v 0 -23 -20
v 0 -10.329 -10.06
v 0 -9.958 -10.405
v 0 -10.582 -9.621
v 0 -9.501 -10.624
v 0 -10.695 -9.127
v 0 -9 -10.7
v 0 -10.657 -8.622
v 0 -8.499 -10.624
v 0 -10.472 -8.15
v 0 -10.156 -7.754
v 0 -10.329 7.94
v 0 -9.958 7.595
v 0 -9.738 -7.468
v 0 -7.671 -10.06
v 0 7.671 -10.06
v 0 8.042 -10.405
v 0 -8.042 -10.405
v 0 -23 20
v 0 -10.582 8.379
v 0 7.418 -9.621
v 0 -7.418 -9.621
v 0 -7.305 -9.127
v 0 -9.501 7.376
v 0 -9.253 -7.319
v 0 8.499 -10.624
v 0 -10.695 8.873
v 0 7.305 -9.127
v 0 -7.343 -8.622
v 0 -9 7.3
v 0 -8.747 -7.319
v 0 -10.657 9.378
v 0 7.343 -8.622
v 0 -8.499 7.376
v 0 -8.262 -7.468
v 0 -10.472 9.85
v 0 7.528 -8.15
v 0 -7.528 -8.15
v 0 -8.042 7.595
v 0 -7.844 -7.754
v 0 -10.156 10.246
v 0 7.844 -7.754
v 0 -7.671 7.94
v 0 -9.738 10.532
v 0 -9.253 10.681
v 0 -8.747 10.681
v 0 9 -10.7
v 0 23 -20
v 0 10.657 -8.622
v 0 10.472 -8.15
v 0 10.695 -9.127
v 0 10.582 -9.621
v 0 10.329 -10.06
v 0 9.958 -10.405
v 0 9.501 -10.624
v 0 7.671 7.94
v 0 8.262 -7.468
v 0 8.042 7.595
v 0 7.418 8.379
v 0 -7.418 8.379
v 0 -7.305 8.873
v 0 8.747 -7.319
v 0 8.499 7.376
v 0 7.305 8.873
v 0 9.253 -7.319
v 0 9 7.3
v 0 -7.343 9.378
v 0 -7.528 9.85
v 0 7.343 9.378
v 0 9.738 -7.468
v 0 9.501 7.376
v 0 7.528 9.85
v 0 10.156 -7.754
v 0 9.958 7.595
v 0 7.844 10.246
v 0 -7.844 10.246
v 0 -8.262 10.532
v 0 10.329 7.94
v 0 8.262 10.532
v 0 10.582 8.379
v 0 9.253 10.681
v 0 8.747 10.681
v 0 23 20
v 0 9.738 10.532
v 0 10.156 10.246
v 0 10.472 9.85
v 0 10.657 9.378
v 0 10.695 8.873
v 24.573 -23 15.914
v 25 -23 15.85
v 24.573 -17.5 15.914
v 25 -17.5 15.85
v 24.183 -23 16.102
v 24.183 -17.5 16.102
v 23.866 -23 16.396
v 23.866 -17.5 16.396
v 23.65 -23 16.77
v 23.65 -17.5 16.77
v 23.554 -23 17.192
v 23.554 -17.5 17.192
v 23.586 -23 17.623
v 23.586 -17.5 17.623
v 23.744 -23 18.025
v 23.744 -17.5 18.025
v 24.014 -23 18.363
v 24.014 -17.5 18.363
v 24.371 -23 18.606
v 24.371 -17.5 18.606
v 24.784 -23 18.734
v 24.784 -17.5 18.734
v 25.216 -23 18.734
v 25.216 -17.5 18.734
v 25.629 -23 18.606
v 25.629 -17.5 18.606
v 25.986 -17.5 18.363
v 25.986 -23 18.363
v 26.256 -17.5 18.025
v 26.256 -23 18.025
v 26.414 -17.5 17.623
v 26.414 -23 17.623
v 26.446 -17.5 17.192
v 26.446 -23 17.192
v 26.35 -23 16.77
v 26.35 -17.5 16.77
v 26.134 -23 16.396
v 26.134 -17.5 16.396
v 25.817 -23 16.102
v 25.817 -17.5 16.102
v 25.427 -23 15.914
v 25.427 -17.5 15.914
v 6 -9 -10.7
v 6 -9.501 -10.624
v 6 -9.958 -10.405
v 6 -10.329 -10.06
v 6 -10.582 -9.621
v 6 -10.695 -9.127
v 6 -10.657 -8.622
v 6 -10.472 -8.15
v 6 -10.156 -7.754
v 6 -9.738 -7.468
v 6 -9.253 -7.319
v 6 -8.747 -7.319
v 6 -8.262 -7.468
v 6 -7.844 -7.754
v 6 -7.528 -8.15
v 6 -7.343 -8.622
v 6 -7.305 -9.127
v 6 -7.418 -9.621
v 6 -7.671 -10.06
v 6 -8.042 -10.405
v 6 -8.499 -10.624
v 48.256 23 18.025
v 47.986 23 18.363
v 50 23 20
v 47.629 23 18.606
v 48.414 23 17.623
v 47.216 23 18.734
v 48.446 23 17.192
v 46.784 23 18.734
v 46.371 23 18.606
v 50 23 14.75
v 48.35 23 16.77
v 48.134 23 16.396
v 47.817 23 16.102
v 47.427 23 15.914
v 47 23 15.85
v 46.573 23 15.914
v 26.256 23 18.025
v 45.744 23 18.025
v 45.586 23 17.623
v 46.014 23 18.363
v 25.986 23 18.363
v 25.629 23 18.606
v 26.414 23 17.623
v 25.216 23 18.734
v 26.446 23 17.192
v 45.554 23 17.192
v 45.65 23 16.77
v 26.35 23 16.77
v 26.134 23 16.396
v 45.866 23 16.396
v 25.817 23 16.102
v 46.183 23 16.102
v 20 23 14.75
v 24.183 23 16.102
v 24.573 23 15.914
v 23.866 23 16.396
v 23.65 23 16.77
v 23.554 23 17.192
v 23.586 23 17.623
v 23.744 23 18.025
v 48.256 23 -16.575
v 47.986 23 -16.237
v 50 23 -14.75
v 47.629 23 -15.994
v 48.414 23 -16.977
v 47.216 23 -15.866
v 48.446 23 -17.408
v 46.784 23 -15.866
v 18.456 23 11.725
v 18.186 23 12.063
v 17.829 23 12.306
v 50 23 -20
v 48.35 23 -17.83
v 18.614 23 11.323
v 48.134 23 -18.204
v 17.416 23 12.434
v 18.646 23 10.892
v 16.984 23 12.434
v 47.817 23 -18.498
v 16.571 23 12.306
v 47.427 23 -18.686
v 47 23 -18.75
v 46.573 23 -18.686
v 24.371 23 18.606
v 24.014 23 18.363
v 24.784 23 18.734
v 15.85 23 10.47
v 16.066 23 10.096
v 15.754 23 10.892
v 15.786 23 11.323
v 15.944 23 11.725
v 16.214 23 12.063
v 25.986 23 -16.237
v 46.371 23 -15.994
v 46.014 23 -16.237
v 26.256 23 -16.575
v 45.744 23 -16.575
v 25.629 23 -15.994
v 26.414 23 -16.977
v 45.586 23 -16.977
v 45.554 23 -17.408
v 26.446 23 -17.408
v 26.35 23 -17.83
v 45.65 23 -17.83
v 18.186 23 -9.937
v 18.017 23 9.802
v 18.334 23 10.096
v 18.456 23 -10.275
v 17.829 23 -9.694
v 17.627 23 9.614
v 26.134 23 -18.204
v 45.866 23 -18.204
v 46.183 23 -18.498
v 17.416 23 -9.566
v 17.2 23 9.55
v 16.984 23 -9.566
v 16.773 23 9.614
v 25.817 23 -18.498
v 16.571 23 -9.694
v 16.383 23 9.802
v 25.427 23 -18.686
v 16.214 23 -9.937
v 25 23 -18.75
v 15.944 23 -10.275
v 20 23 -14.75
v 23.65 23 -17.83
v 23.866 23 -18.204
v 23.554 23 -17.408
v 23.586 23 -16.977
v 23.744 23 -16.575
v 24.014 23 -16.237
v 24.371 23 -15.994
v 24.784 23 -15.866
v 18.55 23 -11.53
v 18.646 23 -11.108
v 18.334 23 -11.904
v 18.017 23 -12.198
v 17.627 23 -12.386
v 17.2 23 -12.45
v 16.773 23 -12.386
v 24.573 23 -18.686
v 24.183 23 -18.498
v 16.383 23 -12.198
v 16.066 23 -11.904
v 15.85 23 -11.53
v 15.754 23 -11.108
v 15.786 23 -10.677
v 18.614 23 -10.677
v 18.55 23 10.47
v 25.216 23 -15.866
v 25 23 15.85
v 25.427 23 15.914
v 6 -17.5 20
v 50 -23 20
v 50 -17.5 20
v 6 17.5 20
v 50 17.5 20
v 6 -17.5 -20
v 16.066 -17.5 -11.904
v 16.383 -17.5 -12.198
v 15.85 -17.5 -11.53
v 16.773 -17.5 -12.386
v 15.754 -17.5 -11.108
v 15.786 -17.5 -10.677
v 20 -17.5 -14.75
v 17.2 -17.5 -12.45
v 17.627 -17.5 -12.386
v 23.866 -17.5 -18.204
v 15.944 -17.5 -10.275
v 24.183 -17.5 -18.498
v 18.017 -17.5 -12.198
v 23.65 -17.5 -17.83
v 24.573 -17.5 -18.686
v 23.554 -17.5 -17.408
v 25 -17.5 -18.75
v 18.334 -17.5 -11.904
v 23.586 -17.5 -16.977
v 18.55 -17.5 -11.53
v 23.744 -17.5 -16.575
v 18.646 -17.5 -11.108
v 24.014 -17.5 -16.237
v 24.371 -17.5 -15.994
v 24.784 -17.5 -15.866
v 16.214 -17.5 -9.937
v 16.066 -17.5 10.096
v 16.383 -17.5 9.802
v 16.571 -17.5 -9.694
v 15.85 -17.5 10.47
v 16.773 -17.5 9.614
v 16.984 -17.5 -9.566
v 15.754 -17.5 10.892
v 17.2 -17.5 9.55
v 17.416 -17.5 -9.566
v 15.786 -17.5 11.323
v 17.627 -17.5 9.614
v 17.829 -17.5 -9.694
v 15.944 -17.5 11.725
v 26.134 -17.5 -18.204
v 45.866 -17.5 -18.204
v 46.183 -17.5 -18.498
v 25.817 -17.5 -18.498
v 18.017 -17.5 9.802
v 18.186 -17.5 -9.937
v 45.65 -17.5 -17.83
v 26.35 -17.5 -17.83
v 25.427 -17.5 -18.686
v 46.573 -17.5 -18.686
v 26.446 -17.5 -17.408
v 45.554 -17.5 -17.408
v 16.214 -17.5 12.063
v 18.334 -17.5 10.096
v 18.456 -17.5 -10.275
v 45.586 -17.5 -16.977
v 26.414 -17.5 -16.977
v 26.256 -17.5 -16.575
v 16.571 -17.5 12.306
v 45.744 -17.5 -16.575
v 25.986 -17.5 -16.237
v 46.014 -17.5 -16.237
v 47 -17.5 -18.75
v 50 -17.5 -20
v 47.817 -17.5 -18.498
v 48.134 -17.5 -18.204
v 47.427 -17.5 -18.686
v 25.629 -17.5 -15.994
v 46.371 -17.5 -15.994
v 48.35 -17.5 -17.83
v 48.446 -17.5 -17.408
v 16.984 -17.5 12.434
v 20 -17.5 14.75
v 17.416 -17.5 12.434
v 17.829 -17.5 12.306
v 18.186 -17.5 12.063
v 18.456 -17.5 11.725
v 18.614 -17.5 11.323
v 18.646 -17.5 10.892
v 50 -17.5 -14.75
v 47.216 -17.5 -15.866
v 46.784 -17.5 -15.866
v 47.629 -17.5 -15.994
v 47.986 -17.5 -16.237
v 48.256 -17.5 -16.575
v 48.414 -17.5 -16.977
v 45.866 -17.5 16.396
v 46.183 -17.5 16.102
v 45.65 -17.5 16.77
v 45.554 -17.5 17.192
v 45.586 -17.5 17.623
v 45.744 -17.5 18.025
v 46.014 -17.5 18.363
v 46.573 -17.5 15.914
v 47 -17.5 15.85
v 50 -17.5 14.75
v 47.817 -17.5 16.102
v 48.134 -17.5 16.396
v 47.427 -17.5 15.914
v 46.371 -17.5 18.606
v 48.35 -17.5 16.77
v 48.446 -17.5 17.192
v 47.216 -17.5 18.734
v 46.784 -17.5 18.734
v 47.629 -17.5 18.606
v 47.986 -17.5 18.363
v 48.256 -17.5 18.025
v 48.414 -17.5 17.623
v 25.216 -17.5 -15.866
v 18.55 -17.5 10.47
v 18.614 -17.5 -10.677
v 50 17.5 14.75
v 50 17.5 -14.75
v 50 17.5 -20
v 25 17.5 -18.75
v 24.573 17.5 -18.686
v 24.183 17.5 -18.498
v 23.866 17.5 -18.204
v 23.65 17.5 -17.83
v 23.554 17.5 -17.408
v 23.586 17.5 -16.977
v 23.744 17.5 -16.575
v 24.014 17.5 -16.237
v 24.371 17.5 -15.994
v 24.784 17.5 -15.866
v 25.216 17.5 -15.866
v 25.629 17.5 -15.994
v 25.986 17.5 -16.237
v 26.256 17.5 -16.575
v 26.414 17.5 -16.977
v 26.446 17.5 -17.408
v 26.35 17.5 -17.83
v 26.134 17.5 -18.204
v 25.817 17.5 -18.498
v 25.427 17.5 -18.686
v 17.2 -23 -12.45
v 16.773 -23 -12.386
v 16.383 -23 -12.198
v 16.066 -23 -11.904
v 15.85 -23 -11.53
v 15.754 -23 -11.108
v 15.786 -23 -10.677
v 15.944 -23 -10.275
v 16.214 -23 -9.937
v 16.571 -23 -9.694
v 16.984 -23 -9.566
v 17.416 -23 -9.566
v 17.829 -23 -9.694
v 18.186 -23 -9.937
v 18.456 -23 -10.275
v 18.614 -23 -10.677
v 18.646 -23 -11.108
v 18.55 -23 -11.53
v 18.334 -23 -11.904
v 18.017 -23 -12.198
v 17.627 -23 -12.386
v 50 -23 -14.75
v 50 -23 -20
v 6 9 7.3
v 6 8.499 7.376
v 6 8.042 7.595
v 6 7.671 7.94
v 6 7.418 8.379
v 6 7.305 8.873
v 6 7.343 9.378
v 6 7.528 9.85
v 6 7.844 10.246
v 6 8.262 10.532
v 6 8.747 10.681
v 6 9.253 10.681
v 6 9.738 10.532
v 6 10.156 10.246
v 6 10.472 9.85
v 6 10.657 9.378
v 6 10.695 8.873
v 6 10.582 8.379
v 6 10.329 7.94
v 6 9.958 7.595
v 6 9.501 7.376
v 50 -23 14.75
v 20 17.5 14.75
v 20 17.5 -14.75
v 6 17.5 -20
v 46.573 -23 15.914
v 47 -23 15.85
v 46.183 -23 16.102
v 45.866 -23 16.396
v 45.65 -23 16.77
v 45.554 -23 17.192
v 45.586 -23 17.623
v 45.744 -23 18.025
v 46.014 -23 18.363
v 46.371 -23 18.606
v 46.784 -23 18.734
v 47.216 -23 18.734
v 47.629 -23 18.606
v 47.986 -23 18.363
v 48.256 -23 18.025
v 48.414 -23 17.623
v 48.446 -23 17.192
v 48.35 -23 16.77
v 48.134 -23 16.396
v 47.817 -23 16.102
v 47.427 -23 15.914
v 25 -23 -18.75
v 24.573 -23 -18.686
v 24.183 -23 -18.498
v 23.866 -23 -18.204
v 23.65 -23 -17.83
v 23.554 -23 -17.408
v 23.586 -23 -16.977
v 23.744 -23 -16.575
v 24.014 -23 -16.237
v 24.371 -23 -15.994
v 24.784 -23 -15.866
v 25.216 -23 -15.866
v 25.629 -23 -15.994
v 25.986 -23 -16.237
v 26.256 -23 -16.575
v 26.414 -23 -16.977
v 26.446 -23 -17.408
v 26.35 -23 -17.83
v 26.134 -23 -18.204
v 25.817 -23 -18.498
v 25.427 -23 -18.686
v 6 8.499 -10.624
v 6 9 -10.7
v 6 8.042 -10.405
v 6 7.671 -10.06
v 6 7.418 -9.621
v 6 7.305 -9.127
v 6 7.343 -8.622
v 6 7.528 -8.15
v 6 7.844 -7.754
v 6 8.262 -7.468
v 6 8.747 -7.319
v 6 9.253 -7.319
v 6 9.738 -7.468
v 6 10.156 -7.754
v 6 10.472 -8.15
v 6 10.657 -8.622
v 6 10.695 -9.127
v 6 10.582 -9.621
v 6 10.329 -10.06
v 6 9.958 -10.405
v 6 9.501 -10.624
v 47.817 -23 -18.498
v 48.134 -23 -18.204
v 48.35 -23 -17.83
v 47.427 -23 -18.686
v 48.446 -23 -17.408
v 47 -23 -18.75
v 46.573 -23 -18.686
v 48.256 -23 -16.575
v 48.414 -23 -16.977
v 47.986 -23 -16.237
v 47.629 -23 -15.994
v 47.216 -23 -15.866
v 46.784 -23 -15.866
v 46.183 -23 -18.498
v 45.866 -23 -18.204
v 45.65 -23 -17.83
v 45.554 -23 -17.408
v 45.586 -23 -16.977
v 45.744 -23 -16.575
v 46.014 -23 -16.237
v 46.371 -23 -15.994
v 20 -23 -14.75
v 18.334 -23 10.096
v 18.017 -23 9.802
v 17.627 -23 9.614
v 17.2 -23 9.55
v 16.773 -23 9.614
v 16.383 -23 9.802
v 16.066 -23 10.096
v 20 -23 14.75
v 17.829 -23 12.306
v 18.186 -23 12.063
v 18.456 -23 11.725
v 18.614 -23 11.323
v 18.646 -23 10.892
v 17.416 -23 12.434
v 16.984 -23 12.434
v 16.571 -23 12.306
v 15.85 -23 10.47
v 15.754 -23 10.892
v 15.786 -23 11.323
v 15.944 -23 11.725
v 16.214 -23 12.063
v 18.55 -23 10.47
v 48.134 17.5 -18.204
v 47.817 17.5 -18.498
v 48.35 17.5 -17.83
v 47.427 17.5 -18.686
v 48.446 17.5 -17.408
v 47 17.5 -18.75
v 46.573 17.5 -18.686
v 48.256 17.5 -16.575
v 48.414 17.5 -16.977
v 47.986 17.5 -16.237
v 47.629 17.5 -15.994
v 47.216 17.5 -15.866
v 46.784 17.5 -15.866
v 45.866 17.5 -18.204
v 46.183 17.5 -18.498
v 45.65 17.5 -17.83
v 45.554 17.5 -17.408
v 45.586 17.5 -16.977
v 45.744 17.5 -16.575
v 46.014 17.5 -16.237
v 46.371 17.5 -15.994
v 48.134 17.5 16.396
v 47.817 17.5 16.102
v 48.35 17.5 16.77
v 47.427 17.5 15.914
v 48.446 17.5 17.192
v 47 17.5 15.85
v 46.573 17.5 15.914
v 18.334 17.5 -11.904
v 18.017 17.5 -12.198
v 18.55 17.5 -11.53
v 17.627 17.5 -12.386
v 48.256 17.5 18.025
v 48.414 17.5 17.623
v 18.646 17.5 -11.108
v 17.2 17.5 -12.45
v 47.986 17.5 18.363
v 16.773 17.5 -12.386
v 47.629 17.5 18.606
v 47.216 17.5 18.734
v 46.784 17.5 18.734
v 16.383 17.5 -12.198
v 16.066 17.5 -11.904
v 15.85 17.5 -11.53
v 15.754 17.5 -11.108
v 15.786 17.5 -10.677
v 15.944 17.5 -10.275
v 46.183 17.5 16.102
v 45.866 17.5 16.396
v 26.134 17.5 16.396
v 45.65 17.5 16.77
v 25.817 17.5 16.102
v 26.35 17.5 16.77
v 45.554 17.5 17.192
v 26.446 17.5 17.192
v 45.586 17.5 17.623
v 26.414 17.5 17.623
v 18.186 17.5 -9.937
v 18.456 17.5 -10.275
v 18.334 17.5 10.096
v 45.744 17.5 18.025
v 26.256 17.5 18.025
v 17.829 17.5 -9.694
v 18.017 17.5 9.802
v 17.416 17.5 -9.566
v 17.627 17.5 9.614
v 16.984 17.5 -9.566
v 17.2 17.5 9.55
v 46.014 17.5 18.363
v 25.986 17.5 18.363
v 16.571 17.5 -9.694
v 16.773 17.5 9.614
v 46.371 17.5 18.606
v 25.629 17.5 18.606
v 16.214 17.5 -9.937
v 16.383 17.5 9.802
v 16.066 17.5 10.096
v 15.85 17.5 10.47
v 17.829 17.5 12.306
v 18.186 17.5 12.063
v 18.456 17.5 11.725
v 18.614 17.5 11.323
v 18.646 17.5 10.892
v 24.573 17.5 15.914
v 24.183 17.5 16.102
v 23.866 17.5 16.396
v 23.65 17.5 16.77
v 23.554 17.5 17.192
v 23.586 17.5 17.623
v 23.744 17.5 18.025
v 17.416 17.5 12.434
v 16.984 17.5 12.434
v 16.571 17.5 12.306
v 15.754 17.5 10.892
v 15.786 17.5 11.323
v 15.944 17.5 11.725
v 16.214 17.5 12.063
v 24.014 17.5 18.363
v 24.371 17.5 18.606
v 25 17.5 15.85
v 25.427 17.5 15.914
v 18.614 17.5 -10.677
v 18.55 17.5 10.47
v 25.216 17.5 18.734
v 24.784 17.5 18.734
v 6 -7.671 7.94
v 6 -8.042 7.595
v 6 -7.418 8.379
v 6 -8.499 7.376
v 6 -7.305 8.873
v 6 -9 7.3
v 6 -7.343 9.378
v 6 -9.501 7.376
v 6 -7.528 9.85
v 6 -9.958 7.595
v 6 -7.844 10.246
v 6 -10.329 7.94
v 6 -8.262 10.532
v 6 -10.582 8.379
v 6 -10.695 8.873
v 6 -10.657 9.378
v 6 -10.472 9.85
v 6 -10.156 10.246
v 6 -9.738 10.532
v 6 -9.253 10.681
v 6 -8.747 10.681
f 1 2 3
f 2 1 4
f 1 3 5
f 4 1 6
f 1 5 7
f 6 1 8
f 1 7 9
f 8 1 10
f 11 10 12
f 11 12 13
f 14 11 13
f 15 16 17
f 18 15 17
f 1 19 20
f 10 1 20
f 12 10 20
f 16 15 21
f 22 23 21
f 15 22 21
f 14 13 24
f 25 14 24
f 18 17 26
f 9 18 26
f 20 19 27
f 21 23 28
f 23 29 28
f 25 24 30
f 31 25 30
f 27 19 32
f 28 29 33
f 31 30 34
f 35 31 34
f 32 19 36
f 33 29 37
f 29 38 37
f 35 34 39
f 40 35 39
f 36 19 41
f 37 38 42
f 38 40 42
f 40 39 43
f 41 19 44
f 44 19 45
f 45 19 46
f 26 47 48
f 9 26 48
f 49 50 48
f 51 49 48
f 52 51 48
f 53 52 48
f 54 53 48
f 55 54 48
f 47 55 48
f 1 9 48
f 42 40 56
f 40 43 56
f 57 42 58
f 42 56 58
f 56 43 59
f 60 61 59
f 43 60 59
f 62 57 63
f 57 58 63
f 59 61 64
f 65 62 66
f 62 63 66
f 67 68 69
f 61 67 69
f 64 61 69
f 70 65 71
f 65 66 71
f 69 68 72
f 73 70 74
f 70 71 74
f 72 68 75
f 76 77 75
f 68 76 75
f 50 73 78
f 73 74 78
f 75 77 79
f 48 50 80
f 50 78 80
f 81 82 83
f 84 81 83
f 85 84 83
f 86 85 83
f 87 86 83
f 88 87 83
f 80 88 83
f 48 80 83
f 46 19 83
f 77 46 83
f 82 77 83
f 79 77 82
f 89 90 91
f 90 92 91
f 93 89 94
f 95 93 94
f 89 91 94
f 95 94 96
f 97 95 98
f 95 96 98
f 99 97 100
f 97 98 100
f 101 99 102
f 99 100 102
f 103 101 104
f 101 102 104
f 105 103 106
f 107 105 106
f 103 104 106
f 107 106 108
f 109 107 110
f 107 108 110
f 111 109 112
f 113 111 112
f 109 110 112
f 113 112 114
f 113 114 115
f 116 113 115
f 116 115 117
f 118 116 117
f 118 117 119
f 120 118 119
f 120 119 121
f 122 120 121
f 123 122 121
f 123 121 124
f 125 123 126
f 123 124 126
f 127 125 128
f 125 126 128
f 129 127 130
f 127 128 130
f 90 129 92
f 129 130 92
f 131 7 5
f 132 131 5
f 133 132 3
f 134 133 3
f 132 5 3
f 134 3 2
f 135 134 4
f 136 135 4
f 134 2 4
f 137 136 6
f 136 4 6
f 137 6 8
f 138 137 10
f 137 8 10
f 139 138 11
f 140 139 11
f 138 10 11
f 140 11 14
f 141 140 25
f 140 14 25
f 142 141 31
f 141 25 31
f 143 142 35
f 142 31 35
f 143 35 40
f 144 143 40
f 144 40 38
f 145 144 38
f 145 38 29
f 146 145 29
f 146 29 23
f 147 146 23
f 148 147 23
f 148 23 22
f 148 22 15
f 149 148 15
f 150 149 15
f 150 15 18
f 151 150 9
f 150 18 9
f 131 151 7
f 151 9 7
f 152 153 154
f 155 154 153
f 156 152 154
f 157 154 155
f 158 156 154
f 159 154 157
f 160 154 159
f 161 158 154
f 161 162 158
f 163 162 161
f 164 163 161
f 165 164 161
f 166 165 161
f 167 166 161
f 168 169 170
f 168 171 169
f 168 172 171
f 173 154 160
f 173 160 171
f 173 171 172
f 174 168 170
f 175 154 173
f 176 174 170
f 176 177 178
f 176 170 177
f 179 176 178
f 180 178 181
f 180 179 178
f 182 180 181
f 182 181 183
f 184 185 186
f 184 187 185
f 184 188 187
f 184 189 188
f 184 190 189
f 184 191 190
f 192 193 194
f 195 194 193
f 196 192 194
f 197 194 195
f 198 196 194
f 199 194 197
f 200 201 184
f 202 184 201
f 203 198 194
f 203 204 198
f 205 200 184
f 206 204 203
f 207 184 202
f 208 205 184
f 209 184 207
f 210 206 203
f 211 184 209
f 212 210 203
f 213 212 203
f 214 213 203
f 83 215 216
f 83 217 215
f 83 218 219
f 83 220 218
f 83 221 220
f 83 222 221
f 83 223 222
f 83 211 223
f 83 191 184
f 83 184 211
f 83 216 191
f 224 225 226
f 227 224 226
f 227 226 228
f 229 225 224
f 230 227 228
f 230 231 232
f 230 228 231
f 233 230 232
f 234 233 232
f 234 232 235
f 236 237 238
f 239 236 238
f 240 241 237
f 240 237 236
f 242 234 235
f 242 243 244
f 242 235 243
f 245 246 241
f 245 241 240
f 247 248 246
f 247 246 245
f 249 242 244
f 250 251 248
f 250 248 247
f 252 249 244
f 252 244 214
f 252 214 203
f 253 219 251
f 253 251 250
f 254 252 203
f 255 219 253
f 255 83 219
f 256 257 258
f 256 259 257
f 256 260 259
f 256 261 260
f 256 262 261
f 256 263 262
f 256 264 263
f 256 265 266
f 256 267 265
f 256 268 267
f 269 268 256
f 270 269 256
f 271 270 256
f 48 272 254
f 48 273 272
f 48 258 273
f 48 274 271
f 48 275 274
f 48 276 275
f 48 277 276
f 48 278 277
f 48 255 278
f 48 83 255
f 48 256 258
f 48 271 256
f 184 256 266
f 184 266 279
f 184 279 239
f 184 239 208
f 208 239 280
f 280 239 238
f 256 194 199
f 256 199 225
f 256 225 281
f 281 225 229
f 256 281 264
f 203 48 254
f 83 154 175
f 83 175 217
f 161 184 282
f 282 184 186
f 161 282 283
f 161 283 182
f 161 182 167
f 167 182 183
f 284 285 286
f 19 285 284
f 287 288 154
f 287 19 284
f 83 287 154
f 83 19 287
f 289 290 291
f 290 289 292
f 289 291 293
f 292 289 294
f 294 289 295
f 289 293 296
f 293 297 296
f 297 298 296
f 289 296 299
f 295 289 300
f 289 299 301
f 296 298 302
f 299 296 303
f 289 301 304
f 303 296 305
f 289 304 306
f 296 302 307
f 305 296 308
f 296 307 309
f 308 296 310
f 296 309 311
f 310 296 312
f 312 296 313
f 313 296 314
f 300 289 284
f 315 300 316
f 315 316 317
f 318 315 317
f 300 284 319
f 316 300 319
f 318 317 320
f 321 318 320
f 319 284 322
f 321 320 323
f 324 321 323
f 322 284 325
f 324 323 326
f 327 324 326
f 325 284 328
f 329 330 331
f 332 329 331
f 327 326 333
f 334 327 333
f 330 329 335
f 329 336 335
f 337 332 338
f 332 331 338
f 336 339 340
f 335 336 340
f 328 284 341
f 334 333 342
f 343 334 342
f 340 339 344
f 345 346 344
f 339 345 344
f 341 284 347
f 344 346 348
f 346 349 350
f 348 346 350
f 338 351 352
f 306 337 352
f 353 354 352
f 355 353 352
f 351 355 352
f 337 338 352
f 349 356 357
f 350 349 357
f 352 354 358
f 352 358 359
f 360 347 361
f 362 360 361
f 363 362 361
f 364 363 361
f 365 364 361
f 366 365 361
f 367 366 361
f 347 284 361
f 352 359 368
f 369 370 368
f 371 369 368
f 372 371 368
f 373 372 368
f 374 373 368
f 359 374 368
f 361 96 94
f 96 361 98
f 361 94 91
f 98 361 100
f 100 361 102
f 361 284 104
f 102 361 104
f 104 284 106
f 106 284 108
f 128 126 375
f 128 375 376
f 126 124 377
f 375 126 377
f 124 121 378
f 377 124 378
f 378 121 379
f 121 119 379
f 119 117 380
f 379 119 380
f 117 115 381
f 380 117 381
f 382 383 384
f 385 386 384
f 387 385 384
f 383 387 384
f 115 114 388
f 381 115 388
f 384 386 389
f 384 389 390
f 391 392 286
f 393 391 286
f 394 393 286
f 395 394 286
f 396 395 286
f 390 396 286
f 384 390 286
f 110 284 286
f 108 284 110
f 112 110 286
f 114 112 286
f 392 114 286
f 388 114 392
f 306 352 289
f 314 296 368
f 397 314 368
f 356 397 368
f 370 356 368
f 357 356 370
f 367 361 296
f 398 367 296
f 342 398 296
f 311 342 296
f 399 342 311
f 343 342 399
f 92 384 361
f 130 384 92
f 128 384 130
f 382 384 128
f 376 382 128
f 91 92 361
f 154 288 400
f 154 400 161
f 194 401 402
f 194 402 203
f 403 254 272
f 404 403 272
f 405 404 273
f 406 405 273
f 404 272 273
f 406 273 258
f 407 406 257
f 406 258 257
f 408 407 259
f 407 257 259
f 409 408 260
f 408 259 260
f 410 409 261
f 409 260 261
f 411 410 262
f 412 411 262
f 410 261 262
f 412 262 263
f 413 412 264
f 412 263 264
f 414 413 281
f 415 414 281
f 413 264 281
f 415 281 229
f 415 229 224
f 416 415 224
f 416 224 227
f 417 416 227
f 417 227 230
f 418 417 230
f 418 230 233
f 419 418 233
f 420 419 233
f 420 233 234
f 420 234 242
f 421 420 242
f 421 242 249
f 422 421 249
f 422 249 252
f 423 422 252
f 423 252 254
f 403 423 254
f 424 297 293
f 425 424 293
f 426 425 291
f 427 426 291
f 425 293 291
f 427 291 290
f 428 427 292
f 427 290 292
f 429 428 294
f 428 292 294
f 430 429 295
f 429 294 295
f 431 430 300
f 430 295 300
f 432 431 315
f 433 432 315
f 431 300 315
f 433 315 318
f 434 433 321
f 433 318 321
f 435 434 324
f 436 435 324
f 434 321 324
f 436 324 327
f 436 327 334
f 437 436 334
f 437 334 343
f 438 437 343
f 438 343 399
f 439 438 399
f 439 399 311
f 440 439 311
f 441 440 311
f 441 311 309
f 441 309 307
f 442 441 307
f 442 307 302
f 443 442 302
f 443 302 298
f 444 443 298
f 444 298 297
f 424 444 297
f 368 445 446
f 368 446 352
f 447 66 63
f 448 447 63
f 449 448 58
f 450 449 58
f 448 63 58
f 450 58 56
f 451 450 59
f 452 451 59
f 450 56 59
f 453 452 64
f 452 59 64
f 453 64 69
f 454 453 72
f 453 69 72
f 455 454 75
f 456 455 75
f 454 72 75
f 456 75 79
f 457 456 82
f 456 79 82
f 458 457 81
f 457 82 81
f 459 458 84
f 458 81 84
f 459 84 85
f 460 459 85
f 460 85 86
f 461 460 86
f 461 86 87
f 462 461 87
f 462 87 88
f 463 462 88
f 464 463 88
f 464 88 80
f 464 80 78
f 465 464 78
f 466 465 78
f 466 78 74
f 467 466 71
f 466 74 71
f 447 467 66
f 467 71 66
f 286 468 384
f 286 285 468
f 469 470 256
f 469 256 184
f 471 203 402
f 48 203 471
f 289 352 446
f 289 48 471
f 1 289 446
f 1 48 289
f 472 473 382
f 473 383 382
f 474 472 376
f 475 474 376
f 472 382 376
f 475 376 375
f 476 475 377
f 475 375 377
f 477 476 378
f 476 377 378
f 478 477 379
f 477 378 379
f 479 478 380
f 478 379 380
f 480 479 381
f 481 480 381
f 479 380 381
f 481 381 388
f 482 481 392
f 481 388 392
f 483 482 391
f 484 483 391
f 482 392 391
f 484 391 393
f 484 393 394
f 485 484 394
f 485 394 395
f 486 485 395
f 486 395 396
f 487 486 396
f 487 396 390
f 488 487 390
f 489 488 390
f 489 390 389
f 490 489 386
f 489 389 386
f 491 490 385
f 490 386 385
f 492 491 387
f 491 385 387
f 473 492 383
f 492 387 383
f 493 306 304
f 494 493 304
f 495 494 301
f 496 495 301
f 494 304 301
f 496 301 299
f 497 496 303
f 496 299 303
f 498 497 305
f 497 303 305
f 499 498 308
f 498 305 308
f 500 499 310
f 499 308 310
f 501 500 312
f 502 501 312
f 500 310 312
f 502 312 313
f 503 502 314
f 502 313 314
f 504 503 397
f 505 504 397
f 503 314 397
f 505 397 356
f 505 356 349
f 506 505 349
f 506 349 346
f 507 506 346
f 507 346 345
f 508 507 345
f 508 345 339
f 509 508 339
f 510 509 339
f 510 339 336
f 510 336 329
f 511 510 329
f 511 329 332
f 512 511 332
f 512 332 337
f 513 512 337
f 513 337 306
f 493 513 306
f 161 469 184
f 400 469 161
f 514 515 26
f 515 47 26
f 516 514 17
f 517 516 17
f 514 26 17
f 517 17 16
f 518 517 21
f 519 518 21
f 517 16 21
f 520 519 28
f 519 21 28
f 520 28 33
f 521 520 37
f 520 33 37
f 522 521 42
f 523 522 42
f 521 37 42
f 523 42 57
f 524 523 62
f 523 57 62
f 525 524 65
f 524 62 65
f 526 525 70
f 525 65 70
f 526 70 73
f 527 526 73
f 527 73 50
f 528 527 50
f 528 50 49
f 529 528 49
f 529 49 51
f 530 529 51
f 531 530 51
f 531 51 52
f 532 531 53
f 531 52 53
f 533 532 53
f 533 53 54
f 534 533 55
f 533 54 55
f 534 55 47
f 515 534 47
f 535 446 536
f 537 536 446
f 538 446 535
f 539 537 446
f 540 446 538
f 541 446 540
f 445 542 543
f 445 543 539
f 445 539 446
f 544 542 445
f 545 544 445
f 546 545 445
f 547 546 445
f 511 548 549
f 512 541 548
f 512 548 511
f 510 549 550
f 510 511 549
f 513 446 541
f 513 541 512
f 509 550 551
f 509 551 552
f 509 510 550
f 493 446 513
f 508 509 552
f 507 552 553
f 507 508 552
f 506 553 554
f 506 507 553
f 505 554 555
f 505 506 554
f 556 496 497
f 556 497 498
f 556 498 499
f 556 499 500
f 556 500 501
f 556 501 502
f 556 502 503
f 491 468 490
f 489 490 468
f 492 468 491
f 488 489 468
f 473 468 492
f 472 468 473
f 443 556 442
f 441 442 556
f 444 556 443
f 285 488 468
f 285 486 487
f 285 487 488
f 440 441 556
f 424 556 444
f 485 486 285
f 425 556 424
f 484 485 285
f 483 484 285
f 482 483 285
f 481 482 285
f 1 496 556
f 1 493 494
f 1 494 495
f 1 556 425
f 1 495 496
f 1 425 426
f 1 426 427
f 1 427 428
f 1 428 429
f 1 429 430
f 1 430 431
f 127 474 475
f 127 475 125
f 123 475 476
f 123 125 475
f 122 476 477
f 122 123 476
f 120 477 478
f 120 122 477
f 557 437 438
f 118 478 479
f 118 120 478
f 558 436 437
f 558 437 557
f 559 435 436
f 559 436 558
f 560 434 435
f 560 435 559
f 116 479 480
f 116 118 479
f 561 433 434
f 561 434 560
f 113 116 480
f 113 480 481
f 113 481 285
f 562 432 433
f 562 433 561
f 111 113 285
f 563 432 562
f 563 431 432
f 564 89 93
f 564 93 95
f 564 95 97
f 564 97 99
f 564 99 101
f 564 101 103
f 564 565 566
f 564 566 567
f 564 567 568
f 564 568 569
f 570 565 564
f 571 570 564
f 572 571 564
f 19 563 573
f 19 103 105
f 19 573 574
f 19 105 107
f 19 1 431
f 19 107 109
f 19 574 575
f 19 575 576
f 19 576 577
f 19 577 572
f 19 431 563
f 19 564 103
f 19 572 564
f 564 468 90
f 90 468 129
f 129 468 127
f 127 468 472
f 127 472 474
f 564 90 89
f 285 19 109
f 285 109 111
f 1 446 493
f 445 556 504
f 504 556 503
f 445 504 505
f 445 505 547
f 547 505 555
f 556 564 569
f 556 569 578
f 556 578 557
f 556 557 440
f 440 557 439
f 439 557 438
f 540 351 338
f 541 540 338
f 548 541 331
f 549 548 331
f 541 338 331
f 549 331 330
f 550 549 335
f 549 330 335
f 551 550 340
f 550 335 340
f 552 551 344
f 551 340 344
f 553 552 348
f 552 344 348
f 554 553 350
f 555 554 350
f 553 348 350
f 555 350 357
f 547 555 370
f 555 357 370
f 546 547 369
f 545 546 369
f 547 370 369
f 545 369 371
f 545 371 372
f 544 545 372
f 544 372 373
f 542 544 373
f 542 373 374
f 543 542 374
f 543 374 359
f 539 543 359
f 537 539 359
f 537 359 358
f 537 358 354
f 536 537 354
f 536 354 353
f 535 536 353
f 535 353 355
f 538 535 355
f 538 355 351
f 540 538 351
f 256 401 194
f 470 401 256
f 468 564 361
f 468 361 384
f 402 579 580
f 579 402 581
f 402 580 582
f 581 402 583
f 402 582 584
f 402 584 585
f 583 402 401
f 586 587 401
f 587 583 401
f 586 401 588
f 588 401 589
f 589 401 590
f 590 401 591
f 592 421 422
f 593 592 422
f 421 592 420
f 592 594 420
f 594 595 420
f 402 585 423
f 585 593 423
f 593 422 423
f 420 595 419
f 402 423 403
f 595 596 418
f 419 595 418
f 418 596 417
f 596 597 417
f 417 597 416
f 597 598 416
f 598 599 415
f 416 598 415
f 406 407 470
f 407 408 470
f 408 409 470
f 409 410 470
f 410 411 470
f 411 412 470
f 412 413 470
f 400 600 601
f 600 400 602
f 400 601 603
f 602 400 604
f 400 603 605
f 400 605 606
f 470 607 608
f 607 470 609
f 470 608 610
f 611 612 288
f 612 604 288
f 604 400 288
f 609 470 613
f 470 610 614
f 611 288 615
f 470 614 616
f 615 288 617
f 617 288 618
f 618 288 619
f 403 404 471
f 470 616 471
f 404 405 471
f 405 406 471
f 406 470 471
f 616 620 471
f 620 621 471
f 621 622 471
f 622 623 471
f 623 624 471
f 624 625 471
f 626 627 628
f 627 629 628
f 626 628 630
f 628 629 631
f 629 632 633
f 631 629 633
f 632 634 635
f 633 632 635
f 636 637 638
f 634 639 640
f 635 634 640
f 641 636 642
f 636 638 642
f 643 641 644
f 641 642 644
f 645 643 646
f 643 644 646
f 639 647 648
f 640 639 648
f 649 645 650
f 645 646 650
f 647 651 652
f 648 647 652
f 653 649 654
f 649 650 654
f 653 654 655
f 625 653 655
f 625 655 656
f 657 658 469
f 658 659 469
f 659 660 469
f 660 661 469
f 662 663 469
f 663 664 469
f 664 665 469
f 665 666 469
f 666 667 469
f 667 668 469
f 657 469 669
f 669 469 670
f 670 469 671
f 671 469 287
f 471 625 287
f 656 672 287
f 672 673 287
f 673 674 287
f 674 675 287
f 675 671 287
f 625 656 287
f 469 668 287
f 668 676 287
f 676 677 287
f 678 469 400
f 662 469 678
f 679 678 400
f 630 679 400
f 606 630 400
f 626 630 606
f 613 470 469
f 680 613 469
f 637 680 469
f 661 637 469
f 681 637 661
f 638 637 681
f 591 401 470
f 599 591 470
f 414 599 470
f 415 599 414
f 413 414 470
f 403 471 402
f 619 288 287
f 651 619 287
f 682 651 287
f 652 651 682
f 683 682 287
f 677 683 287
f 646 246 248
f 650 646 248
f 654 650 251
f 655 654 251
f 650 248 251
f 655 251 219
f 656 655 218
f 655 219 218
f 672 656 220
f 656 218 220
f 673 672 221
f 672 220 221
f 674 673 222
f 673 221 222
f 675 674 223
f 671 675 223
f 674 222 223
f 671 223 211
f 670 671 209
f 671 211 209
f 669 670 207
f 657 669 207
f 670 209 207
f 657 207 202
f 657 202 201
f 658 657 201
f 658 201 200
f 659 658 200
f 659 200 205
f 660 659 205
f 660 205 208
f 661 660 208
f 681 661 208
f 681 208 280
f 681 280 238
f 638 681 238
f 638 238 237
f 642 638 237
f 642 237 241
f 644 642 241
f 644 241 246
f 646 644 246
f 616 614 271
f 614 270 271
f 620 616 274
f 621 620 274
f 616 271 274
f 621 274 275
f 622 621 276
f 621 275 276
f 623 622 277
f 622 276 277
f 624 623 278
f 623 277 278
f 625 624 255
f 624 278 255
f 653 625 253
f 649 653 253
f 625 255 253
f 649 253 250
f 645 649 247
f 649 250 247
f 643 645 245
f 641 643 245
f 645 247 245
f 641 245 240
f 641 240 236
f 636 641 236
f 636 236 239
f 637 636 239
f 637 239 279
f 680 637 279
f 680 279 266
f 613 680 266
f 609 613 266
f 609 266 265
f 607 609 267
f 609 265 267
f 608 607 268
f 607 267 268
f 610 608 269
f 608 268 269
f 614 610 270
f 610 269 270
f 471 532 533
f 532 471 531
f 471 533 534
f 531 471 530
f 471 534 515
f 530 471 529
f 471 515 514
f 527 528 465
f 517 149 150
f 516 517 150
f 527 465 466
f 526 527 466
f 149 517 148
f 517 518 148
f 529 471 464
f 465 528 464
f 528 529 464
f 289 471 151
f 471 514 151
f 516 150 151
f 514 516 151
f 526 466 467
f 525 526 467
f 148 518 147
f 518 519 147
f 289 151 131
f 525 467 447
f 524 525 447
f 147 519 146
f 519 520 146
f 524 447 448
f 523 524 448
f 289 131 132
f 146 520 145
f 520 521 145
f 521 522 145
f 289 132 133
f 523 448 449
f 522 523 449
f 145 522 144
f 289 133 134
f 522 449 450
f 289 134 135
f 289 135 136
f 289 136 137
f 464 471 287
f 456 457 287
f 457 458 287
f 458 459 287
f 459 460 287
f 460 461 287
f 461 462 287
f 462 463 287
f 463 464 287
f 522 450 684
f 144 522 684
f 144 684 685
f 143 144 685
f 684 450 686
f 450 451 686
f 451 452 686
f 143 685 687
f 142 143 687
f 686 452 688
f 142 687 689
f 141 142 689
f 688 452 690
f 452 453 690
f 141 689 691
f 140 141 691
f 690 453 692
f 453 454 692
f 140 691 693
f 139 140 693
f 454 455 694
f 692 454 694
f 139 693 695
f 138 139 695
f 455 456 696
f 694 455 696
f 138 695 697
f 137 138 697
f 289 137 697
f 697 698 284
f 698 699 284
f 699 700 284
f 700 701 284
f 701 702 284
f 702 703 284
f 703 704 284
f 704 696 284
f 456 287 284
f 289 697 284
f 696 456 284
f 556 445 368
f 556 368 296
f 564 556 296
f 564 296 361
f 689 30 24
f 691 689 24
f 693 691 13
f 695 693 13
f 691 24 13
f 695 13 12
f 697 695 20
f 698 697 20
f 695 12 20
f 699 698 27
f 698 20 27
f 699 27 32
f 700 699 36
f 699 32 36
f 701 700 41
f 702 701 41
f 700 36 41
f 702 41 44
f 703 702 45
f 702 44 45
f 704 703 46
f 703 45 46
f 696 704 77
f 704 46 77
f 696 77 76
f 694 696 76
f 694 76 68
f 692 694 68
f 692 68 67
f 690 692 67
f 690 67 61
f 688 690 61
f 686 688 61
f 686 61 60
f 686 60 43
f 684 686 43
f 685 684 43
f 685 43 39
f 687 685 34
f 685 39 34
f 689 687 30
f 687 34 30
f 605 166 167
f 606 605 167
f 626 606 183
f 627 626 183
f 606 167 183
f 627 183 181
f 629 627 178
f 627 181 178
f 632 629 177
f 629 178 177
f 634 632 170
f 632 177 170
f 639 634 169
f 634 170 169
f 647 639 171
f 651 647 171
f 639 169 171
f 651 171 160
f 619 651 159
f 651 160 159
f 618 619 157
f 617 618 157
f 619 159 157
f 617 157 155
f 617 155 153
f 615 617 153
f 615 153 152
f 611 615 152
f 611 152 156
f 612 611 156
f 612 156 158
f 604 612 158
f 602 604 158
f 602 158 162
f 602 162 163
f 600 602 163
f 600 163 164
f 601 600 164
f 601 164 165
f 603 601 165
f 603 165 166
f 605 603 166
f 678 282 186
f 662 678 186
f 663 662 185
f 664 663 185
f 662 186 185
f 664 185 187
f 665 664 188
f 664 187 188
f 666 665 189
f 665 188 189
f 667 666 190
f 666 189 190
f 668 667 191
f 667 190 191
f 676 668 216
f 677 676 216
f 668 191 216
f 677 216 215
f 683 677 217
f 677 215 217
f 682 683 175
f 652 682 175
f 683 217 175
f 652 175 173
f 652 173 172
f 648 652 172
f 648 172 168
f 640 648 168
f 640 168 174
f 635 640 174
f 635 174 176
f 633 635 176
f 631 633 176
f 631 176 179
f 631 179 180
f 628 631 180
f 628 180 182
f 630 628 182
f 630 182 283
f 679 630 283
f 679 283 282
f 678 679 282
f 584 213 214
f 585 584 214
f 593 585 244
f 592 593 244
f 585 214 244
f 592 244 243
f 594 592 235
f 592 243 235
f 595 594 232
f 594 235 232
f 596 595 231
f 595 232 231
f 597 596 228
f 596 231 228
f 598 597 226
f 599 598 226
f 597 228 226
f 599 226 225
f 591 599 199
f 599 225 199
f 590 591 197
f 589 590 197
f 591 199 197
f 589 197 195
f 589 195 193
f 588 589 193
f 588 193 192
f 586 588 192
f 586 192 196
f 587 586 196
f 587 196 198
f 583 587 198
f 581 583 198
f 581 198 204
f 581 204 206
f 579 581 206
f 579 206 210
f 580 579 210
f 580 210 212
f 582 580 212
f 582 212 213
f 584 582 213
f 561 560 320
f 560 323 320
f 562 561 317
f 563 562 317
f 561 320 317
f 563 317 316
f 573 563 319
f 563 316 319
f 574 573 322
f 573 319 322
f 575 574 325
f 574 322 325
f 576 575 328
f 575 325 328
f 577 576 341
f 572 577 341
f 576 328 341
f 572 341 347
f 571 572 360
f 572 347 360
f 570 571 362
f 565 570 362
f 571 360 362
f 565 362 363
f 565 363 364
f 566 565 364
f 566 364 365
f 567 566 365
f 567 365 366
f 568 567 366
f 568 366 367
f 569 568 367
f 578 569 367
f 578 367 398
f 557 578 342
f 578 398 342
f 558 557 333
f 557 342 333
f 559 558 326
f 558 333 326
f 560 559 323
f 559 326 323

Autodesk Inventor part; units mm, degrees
ref_plane "YZ Plane" through (0, 0, 0) normal (1, 0, 0) x (0, 1, 0)
ref_plane "XZ Plane" through (0, 0, 0) normal (0, 1, 0) x (-1, 0, 0)
ref_plane "XY Plane" through (0, 0, 0) normal (0, 0, 1) x (1, 0, 0)
sketch "Skizze1" plane through (0, 0, 0) normal (1, 0, 0) x (0, 1, 0)
  line L0 (-23, 20) -> (23, 20)
  line L1 (23, 20) -> (23, -20)
  line L2 (23, -20) -> (-23, -20)
  line L3 (-23, -20) -> (-23, 20)
  line L4 (-23, 20) -> (23, -20) construction
  line L5 (23, 20) -> (-23, -20) construction
  point P0 (0, 0)
  dimension "d0" = 46
  dimension "d1" = 40
extrude "Extrusion1" add sketch "Skizze1" along normal blind 50
sketch "Skizze2" plane through (0, -23, 20) normal (0, 0, 1) x (1, 0, 0)
  line L0 (0, 0) -> (0, 46) projected
  line L1 (0, 0) -> (50, 0) projected
  line L2 (50, 46) -> (50, 0) projected
  line L3 (0, 46) -> (50, 46) projected
  line L4 (50, 46) -> (50, 0) projected
  line L5 (50, 40.5) -> (6, 40.5)
  line L6 (6, 40.5) -> (6, 5.5)
  line L7 (6, 5.5) -> (50, 5.5)
  line L8 (50, 5.5) -> (50, 40.5)
  point P0 (0, 23)
  dimension "d4" = 5.5
  dimension "d5" = 5.5
  dimension "d6" = 6
extrude "Extrusion2" cut sketch "Skizze2" against normal through all contours L7 L6 L5 L2
sketch "Skizze3" plane through (0, -23, -20) normal (0, -1, 0) x (1, 0, 0)
  line L0 (0, 0) -> (0, 40) projected
  line L1 (0, 0) -> (50, 0) projected
  line L2 (50, 40) -> (50, 0) projected
  line L3 (0, 40) -> (50, 40) projected
  line L4 (0, 20) -> (44.7617, 20) construction
  line L5 (20, 34.75) -> (50, 34.75)
  line L6 (50, 34.75) -> (50, 5.25)
  line L7 (50, 5.25) -> (20, 5.25)
  line L8 (20, 5.25) -> (20, 34.75)
  line L9 (20, 34.75) -> (50, 5.25) construction
  line L10 (50, 34.75) -> (20, 5.25) construction
  point P0 (35, 20)
  dimension "d9" = 29.5
  dimension "d10" = 30
extrude "Extrusion3" cut sketch "Skizze3" against normal through all contours L7 L8 L5 L2
sketch "Skizze4" plane through (0, -23, -20) normal (0, -1, 0) x (1, 0, 0)
  line L0 (50, 5.25) -> (20, 5.25) projected
  line L1 (20, 5.25) -> (20, 34.75) projected
  line L2 (20, 34.75) -> (50, 34.75) projected
  line L3 (50, 40) -> (50, 34.75) projected
  line L4 (0, 40) -> (50, 40) projected
  line L5 (0, 0) -> (0, 40) projected
  line L6 (0, 0) -> (50, 0) projected
  line L7 (50, 5.25) -> (50, 0) projected
  line L8 (0, 20) -> (84.4351, 20) construction
  point P0 (25, 37.3)
  point P1 (25, 2.7)
  point P2 (17.2, 31)
  point P3 (17.2, 9)
  point P4 (47, 37.3)
  point P5 (47, 2.7)
  dimension "d13" = 5
  dimension "d14" = 5
  dimension "d15" = 34.6
  dimension "d16" = 17.3
  dimension "d17" = 22
  dimension "d18" = 11
  dimension "d19" = 2.8
  dimension "d20" = 2.8
  dimension "d47" = 17.3
  dimension "d48" = 17.3
  dimension "d49" = 22
  dimension "d50" = 22
hole "Bohrung1" at (25, -23, 17.3) at (25, -23, -17.3) at (17.2, -23, 11) at (17.2, -23, -11) at (47, -23, 17.3) at (47, -23, -17.3) direction (0, 1, 0) diameter 2.9 end through all clearance for "Inbusschraube ISO 4762" size "M2.5" standard "ISO"
sketch "Skizze7" plane through (6, -17.5, 20) normal (1, 0, 0) x (0, 0, -1)
  line L0 (29, 8.5) -> (11, 8.5)
  line L1 (11, 8.5) -> (11, 26.5)
  line L2 (11, 26.5) -> (29, 26.5)
  line L3 (29, 26.5) -> (29, 8.5)
  line L4 (29, 8.5) -> (11, 26.5) construction
  line L5 (11, 8.5) -> (29, 26.5) construction
  point P0 (20, 17.5)
  dimension "d52" = 18
  dimension "d53" = 18
hole "Bohrung3" at (6, -9, 9) at (6, 9, 9) at (6, 9, -9) at (6, -9, -9) direction (-1, 0, 0) diameter 3.4 end through all clearance for "Inbusschraube ISO 4762" size "M3" standard "ISO"
equation "\"d5\" = d4"
equation "\"d13\" = d14"
equation "\"d16\" = 0.5 * d15"
equation "\"d18\" = 0.5 * d17"
equation "\"d20\" = d19"
equation "\"d47\" = d16"
equation "\"d48\" = d16"
equation "\"d50\" = d49"
equation "\"d53\" = d52"
properties part number "connection_hand" material "Aluminium 6061"
